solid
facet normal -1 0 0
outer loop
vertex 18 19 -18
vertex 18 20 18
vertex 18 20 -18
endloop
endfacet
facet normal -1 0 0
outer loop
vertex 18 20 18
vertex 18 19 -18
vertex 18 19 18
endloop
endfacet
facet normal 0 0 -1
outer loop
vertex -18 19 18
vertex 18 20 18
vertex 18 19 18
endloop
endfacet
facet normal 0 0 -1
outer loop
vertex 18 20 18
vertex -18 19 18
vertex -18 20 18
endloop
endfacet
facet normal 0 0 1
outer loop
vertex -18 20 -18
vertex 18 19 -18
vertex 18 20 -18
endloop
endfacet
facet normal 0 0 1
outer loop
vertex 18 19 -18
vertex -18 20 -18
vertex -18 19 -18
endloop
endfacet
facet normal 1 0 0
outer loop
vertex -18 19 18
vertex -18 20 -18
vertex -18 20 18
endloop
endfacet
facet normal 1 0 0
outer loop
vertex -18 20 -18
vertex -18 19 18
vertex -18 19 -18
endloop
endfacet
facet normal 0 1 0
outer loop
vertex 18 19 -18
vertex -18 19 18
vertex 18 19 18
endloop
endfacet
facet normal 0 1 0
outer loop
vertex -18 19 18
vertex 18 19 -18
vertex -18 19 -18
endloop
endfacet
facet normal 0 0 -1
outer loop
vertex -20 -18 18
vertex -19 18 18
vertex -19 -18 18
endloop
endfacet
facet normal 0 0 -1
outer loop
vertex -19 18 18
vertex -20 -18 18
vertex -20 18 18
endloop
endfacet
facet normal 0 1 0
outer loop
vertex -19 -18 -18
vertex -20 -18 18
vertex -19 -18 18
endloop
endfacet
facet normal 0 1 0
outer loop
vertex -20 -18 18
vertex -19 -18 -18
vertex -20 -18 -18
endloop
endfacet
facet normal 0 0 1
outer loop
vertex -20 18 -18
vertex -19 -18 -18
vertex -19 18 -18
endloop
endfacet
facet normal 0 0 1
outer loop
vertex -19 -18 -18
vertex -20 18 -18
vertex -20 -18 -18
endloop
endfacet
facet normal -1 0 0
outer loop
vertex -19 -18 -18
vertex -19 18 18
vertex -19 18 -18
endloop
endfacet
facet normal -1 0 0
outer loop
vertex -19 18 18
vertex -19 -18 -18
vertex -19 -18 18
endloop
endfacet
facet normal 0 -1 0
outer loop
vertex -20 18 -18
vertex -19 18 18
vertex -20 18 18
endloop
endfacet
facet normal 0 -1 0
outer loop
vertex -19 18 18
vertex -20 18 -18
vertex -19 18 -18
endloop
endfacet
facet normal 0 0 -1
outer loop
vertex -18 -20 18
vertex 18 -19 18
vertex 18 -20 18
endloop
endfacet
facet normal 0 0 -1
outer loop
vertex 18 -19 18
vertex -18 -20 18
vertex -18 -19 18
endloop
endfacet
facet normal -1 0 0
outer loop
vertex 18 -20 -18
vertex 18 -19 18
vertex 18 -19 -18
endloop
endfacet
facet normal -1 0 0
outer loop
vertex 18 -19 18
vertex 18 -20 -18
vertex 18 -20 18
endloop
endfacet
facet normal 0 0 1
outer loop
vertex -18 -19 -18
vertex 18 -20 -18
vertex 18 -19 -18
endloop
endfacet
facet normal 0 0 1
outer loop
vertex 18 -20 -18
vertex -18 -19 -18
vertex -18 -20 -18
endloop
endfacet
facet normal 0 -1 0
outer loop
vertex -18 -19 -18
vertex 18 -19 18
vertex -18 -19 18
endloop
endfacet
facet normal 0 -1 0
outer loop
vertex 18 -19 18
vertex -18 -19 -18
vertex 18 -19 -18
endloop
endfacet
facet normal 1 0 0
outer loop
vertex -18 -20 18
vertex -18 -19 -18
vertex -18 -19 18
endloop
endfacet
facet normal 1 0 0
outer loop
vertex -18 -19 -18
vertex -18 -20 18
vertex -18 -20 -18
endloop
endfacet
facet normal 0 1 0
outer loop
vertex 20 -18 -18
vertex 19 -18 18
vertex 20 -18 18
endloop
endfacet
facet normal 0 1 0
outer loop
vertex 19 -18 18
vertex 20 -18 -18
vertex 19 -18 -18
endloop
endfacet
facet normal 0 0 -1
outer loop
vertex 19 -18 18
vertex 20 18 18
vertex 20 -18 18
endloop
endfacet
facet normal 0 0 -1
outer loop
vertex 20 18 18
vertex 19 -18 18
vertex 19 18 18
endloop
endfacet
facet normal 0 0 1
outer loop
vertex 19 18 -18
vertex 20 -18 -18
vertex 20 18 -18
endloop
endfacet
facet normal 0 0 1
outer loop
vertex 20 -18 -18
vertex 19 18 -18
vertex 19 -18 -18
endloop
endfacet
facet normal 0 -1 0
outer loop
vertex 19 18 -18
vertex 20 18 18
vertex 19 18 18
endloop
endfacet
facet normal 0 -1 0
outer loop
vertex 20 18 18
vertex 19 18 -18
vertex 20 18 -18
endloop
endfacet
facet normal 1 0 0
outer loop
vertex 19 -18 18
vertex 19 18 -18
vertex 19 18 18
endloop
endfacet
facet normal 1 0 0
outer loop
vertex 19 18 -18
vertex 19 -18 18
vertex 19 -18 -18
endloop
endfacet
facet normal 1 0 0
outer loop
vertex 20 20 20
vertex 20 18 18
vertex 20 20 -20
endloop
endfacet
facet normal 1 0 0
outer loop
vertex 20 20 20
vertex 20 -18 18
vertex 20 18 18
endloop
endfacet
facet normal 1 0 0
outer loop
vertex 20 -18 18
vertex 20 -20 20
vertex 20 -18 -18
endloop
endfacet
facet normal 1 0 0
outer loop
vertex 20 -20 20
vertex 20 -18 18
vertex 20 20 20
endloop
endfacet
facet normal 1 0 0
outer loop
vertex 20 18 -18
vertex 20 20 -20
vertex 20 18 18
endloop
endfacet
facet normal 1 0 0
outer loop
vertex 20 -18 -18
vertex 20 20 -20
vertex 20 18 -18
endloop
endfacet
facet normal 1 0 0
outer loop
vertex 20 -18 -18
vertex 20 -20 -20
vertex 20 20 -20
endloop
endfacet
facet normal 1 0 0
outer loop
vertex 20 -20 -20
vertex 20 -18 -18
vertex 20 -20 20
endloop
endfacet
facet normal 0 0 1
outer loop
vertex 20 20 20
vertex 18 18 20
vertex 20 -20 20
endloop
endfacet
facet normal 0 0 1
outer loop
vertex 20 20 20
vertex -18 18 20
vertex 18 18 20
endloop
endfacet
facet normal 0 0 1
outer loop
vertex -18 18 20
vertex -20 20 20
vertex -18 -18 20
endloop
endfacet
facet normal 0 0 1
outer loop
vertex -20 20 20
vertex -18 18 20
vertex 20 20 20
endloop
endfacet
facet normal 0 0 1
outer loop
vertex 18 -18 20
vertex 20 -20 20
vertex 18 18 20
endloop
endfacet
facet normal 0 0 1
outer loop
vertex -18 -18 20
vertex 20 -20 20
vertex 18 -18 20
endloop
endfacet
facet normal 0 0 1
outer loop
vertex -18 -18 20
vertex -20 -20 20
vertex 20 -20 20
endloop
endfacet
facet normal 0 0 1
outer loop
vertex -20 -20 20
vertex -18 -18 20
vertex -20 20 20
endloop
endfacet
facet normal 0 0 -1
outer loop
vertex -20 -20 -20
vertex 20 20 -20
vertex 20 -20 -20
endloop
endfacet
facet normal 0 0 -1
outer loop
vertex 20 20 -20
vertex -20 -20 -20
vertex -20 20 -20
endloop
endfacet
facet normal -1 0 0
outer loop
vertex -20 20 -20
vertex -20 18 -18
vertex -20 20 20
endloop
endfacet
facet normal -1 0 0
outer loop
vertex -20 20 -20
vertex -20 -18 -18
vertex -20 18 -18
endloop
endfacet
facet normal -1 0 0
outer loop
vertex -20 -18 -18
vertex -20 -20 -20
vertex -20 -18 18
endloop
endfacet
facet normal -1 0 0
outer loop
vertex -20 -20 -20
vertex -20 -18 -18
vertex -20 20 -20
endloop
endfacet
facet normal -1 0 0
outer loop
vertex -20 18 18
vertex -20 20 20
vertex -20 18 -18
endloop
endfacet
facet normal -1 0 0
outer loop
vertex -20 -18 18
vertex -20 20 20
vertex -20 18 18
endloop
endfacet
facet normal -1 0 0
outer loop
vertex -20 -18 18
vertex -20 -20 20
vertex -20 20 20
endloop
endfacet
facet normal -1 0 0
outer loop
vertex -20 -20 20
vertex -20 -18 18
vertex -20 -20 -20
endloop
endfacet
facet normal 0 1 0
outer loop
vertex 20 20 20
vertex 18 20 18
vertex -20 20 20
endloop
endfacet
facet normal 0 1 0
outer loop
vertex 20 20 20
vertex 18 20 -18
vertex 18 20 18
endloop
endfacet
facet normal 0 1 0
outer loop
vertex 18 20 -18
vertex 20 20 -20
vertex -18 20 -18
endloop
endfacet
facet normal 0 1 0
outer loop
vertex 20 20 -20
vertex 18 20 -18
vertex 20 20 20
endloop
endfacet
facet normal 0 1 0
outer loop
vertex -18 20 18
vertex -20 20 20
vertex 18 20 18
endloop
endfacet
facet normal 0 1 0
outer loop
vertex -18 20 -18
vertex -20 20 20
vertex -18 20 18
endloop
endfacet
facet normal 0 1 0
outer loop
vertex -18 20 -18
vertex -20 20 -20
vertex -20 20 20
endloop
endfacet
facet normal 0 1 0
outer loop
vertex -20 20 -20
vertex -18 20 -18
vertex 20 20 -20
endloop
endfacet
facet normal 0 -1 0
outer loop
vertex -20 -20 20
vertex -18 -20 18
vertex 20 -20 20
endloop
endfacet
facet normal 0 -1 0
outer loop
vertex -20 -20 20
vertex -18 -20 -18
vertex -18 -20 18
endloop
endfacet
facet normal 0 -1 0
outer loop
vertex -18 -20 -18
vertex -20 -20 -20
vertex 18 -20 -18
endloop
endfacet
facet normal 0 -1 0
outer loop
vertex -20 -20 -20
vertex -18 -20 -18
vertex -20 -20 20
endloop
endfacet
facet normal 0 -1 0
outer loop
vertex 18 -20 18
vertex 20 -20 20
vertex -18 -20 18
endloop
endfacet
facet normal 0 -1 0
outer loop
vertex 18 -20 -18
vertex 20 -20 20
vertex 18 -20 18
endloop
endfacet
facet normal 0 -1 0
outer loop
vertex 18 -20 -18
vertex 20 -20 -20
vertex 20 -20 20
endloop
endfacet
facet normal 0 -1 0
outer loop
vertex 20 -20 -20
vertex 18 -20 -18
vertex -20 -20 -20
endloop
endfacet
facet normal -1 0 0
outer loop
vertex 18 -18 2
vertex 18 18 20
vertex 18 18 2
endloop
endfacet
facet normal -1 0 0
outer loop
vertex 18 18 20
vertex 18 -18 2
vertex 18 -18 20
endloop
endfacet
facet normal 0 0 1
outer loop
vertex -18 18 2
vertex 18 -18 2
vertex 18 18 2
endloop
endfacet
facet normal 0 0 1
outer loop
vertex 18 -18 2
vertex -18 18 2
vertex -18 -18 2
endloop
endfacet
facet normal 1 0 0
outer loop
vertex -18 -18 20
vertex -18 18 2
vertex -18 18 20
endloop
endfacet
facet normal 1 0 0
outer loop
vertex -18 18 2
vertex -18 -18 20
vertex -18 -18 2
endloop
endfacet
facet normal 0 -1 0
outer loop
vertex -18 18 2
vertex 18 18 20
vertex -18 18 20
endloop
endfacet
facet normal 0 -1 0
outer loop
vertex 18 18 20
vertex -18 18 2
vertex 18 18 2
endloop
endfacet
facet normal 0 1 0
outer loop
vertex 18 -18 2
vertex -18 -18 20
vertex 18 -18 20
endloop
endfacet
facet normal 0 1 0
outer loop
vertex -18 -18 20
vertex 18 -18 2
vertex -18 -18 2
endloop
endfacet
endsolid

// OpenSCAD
x=40;
y=40;
z=40;
a=2;
inset=2;
inlay=2;

union(){
    difference(){
        cube([x,y,z],center=true);
        for(i=[0:4]){
            rotate([0,0,90*i]){
                translate([0,z/2,0]){
                    // subtract inlay
                    cube([x-(inset*2),inlay,z-(inset*2)],center=true);
                }
            }
        }
        translate([0,0,z/2+a]){
            cube([x-(a*2),y-(a*2),z],center=true);
        }
    }
    
    for(i=[0:4]){
        rotate([0,0,90*i]){

                translate([0,z/2-inlay/2,0]){
                    rotate([-90,0,0]){
                        scale([(x-(inset*2))/32+0.1,(y-(inset*2))/32+0.1,0.005]){
                            surface(file="data/texture.png",center=true);
                        }
                    }
                }

        }
    }
}
